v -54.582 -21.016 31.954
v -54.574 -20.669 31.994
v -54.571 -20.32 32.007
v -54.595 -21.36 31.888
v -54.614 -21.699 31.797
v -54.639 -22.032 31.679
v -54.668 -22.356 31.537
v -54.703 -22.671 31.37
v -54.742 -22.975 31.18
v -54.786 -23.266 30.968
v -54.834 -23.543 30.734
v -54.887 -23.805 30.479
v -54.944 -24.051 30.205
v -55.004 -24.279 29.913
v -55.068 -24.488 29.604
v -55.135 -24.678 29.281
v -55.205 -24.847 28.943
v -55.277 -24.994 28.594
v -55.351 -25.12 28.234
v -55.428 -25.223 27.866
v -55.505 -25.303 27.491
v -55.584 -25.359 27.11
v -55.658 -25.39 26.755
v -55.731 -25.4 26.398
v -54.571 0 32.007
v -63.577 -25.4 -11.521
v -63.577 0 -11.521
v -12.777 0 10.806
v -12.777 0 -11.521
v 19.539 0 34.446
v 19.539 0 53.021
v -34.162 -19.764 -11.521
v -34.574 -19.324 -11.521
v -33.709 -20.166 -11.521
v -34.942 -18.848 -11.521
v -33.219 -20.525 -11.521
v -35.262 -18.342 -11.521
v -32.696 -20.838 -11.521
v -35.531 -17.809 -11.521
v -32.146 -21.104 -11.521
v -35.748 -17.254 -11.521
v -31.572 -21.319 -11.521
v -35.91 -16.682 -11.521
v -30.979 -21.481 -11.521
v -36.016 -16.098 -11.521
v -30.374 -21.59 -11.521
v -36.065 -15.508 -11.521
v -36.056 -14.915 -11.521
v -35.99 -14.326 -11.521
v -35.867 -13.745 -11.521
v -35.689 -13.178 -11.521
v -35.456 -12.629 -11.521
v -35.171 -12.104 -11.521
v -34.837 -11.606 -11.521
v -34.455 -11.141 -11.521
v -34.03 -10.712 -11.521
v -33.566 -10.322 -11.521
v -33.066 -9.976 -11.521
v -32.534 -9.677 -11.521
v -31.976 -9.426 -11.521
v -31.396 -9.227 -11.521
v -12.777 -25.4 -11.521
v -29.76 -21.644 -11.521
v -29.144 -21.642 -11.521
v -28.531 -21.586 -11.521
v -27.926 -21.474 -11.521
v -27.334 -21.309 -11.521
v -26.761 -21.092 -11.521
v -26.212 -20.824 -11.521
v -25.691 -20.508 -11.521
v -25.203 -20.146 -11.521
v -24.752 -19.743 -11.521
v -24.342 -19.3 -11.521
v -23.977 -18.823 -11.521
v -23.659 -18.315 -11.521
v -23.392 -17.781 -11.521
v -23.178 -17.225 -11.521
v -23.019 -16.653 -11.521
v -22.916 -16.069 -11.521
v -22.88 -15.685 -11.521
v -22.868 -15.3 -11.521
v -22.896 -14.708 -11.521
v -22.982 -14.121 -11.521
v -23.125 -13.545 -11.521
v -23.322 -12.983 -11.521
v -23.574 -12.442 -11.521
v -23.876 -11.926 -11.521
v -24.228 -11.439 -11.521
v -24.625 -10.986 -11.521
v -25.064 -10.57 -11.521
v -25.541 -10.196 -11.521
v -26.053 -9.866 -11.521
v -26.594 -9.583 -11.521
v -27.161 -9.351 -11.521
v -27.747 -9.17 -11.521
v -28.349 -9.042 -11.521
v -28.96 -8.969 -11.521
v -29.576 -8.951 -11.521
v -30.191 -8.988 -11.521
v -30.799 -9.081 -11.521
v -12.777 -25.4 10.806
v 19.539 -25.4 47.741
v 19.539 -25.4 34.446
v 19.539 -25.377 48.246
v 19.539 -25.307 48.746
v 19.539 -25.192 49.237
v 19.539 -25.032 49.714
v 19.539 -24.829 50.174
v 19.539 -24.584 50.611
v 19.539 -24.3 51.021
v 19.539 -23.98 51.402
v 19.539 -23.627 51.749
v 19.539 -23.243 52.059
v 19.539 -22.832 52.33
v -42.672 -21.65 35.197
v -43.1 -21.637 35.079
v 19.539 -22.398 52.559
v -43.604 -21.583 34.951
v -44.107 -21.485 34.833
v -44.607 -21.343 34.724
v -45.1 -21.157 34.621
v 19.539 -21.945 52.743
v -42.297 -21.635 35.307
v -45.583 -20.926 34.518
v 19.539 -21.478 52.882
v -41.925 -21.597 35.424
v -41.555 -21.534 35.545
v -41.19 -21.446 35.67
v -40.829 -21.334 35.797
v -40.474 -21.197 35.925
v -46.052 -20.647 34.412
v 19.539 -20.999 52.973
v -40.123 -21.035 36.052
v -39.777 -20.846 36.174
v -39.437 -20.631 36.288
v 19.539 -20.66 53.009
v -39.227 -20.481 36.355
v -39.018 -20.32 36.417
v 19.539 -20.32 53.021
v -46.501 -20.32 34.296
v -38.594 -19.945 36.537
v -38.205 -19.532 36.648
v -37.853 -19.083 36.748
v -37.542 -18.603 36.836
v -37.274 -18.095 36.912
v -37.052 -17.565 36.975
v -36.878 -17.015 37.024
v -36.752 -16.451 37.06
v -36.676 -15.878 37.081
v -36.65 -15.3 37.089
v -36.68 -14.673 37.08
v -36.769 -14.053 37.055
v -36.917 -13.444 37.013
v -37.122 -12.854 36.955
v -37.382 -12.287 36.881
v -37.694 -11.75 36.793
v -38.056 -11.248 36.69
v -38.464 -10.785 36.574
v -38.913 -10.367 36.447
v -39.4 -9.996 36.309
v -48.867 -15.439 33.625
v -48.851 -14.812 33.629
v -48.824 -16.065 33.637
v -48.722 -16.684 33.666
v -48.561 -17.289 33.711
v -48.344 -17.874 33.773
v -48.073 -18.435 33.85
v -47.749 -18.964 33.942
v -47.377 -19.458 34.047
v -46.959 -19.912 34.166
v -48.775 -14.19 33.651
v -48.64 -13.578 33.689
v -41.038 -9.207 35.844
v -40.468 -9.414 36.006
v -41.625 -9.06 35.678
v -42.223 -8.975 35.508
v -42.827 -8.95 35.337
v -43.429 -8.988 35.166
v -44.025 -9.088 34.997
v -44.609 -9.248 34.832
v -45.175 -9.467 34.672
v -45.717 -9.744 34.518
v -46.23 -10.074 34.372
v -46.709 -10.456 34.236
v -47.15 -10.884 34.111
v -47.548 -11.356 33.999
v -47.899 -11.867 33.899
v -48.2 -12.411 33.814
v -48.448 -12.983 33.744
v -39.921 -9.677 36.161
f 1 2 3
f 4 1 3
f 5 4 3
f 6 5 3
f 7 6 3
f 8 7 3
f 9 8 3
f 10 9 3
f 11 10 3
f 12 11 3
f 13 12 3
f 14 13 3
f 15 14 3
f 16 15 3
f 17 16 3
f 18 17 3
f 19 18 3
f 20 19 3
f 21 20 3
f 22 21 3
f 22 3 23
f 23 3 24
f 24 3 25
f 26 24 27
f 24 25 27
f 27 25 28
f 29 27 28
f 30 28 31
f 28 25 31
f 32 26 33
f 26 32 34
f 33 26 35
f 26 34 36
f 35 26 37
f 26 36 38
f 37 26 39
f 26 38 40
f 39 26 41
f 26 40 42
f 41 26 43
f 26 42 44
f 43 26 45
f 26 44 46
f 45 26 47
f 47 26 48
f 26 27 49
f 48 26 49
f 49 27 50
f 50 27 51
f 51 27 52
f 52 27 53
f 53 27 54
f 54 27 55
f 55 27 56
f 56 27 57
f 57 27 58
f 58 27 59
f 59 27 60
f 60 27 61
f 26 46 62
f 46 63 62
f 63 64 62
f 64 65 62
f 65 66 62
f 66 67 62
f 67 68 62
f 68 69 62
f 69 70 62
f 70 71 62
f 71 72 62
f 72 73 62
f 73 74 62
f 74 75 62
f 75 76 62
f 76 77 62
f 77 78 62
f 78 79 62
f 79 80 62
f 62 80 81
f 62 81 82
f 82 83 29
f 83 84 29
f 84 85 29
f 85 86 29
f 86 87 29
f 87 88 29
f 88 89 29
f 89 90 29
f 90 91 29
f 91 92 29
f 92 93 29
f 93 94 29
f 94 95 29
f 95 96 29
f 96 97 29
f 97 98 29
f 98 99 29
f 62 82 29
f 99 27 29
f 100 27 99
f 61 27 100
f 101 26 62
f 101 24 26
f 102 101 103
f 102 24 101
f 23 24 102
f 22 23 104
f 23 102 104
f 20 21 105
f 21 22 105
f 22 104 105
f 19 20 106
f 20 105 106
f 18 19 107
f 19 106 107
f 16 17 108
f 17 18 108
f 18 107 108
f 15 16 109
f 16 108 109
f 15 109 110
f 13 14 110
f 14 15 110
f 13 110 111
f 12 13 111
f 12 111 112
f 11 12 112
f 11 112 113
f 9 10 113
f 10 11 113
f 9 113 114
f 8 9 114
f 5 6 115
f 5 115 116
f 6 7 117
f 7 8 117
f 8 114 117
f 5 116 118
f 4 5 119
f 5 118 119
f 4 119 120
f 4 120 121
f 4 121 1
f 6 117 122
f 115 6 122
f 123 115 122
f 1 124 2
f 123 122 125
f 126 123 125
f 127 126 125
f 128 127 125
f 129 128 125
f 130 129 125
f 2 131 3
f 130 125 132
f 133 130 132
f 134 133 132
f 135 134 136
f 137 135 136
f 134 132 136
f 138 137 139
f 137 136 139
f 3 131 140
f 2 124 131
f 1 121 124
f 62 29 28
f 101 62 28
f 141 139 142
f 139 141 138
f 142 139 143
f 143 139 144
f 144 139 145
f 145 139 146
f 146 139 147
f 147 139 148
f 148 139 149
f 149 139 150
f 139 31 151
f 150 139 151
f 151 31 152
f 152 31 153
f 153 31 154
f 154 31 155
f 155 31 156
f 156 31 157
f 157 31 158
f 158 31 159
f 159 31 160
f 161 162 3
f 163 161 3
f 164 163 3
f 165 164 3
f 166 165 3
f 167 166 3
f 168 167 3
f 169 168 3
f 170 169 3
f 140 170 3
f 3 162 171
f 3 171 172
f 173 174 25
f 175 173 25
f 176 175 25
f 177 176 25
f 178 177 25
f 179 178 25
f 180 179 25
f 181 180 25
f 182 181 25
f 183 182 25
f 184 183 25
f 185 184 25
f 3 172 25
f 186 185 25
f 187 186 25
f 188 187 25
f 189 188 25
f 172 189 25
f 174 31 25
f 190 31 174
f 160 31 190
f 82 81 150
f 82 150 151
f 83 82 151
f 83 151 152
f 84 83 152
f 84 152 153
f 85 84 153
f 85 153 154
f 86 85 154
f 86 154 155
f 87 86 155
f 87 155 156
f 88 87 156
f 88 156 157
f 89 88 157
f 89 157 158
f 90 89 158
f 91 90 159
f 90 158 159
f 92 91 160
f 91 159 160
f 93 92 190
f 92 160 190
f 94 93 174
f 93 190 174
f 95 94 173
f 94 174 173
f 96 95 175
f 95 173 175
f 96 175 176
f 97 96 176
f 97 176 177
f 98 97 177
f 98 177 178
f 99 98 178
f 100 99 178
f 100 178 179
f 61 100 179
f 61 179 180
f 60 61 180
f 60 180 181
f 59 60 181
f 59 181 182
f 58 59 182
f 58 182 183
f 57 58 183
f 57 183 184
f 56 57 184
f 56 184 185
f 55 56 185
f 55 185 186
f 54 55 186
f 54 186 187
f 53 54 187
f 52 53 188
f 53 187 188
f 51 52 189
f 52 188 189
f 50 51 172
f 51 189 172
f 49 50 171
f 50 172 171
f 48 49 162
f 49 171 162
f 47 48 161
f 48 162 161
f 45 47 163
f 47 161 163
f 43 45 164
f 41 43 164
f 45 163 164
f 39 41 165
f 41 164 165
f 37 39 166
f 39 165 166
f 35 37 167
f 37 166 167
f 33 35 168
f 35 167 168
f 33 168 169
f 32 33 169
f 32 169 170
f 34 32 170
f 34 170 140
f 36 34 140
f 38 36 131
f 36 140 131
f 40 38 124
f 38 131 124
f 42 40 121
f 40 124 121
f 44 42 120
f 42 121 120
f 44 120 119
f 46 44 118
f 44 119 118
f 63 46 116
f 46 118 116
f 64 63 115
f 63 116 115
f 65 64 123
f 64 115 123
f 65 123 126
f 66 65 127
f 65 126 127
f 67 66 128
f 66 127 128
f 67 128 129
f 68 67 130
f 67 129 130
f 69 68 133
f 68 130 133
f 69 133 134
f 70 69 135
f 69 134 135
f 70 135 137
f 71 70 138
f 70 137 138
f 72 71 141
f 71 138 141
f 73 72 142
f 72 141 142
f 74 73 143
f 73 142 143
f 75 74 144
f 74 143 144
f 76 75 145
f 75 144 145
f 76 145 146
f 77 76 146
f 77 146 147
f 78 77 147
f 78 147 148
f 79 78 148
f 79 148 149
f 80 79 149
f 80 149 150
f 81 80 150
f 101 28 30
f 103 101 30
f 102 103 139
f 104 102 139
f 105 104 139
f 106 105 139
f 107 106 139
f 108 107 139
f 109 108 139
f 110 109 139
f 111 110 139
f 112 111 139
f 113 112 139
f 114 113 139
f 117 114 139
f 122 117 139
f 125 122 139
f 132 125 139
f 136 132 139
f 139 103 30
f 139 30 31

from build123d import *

# Parameters (mm, degrees)
F1_DEPTH    = 25.4
F2_R        = 6.35
F3_DEPTH    = 62.0948563832
F4_T1_DEPTH = 102.4319350424


# Not quite as in the source:
# - a fillet or chamfer that OpenCascade refuses, or shapes differently, is made with other operations: its cross-section is extruded or revolved along the edge and cut away or added


with BuildPart() as f1:
    # F0 (on Front) → F1 (new body)
    with BuildSketch(Plane.XZ):
        Polygon((-12.7767093225, -11.5208044833), (-12.7767093225, 10.8061201186), (19.5394920482, 34.4463924892), (19.5394920482, 53.020893242), (-54.5708905419, 32.0073212298), (-63.5767093225, -11.5208044833), align=None)
    extrude(amount=F1_DEPTH)

    # F2 (on face) → F3 (cut, through all)
    with BuildSketch(Plane(origin=(-12.4610134404, 0, 43.9473342748), x_dir=(0.96207349, 0, 0.2727903953), z_dir=(-0.2727903953, 0, 0.96207349))):
        with Locations((-31.4930230379, -15.3000373393)):
            Circle(F2_R)
    extrude(amount=-F3_DEPTH, mode=Mode.SUBTRACT)

    # F4: fillet of radius 5.08 on 1 edges, made by hand

    # F4_s2 → F4_t1 (cut)
    with BuildSketch(Plane(origin=(44.218838812, 0, 12.5379969877), x_dir=(0, 1, 0), z_dir=(-0.96207349, 0, -0.2727903953))):
        with BuildLine():
            ThreePointArc((-25.4, -40.5998100459), (-23.9121024484, -44.1919124943), (-20.32, -45.6798100459))
            Line((-20.32, -45.6798100459), (-25.4, -45.6798100459))
            Line((-25.4, -45.6798100459), (-25.4, -40.5998100459))
        make_face()
    extrude(amount=F4_T1_DEPTH, mode=Mode.SUBTRACT)


solid = f1.part
